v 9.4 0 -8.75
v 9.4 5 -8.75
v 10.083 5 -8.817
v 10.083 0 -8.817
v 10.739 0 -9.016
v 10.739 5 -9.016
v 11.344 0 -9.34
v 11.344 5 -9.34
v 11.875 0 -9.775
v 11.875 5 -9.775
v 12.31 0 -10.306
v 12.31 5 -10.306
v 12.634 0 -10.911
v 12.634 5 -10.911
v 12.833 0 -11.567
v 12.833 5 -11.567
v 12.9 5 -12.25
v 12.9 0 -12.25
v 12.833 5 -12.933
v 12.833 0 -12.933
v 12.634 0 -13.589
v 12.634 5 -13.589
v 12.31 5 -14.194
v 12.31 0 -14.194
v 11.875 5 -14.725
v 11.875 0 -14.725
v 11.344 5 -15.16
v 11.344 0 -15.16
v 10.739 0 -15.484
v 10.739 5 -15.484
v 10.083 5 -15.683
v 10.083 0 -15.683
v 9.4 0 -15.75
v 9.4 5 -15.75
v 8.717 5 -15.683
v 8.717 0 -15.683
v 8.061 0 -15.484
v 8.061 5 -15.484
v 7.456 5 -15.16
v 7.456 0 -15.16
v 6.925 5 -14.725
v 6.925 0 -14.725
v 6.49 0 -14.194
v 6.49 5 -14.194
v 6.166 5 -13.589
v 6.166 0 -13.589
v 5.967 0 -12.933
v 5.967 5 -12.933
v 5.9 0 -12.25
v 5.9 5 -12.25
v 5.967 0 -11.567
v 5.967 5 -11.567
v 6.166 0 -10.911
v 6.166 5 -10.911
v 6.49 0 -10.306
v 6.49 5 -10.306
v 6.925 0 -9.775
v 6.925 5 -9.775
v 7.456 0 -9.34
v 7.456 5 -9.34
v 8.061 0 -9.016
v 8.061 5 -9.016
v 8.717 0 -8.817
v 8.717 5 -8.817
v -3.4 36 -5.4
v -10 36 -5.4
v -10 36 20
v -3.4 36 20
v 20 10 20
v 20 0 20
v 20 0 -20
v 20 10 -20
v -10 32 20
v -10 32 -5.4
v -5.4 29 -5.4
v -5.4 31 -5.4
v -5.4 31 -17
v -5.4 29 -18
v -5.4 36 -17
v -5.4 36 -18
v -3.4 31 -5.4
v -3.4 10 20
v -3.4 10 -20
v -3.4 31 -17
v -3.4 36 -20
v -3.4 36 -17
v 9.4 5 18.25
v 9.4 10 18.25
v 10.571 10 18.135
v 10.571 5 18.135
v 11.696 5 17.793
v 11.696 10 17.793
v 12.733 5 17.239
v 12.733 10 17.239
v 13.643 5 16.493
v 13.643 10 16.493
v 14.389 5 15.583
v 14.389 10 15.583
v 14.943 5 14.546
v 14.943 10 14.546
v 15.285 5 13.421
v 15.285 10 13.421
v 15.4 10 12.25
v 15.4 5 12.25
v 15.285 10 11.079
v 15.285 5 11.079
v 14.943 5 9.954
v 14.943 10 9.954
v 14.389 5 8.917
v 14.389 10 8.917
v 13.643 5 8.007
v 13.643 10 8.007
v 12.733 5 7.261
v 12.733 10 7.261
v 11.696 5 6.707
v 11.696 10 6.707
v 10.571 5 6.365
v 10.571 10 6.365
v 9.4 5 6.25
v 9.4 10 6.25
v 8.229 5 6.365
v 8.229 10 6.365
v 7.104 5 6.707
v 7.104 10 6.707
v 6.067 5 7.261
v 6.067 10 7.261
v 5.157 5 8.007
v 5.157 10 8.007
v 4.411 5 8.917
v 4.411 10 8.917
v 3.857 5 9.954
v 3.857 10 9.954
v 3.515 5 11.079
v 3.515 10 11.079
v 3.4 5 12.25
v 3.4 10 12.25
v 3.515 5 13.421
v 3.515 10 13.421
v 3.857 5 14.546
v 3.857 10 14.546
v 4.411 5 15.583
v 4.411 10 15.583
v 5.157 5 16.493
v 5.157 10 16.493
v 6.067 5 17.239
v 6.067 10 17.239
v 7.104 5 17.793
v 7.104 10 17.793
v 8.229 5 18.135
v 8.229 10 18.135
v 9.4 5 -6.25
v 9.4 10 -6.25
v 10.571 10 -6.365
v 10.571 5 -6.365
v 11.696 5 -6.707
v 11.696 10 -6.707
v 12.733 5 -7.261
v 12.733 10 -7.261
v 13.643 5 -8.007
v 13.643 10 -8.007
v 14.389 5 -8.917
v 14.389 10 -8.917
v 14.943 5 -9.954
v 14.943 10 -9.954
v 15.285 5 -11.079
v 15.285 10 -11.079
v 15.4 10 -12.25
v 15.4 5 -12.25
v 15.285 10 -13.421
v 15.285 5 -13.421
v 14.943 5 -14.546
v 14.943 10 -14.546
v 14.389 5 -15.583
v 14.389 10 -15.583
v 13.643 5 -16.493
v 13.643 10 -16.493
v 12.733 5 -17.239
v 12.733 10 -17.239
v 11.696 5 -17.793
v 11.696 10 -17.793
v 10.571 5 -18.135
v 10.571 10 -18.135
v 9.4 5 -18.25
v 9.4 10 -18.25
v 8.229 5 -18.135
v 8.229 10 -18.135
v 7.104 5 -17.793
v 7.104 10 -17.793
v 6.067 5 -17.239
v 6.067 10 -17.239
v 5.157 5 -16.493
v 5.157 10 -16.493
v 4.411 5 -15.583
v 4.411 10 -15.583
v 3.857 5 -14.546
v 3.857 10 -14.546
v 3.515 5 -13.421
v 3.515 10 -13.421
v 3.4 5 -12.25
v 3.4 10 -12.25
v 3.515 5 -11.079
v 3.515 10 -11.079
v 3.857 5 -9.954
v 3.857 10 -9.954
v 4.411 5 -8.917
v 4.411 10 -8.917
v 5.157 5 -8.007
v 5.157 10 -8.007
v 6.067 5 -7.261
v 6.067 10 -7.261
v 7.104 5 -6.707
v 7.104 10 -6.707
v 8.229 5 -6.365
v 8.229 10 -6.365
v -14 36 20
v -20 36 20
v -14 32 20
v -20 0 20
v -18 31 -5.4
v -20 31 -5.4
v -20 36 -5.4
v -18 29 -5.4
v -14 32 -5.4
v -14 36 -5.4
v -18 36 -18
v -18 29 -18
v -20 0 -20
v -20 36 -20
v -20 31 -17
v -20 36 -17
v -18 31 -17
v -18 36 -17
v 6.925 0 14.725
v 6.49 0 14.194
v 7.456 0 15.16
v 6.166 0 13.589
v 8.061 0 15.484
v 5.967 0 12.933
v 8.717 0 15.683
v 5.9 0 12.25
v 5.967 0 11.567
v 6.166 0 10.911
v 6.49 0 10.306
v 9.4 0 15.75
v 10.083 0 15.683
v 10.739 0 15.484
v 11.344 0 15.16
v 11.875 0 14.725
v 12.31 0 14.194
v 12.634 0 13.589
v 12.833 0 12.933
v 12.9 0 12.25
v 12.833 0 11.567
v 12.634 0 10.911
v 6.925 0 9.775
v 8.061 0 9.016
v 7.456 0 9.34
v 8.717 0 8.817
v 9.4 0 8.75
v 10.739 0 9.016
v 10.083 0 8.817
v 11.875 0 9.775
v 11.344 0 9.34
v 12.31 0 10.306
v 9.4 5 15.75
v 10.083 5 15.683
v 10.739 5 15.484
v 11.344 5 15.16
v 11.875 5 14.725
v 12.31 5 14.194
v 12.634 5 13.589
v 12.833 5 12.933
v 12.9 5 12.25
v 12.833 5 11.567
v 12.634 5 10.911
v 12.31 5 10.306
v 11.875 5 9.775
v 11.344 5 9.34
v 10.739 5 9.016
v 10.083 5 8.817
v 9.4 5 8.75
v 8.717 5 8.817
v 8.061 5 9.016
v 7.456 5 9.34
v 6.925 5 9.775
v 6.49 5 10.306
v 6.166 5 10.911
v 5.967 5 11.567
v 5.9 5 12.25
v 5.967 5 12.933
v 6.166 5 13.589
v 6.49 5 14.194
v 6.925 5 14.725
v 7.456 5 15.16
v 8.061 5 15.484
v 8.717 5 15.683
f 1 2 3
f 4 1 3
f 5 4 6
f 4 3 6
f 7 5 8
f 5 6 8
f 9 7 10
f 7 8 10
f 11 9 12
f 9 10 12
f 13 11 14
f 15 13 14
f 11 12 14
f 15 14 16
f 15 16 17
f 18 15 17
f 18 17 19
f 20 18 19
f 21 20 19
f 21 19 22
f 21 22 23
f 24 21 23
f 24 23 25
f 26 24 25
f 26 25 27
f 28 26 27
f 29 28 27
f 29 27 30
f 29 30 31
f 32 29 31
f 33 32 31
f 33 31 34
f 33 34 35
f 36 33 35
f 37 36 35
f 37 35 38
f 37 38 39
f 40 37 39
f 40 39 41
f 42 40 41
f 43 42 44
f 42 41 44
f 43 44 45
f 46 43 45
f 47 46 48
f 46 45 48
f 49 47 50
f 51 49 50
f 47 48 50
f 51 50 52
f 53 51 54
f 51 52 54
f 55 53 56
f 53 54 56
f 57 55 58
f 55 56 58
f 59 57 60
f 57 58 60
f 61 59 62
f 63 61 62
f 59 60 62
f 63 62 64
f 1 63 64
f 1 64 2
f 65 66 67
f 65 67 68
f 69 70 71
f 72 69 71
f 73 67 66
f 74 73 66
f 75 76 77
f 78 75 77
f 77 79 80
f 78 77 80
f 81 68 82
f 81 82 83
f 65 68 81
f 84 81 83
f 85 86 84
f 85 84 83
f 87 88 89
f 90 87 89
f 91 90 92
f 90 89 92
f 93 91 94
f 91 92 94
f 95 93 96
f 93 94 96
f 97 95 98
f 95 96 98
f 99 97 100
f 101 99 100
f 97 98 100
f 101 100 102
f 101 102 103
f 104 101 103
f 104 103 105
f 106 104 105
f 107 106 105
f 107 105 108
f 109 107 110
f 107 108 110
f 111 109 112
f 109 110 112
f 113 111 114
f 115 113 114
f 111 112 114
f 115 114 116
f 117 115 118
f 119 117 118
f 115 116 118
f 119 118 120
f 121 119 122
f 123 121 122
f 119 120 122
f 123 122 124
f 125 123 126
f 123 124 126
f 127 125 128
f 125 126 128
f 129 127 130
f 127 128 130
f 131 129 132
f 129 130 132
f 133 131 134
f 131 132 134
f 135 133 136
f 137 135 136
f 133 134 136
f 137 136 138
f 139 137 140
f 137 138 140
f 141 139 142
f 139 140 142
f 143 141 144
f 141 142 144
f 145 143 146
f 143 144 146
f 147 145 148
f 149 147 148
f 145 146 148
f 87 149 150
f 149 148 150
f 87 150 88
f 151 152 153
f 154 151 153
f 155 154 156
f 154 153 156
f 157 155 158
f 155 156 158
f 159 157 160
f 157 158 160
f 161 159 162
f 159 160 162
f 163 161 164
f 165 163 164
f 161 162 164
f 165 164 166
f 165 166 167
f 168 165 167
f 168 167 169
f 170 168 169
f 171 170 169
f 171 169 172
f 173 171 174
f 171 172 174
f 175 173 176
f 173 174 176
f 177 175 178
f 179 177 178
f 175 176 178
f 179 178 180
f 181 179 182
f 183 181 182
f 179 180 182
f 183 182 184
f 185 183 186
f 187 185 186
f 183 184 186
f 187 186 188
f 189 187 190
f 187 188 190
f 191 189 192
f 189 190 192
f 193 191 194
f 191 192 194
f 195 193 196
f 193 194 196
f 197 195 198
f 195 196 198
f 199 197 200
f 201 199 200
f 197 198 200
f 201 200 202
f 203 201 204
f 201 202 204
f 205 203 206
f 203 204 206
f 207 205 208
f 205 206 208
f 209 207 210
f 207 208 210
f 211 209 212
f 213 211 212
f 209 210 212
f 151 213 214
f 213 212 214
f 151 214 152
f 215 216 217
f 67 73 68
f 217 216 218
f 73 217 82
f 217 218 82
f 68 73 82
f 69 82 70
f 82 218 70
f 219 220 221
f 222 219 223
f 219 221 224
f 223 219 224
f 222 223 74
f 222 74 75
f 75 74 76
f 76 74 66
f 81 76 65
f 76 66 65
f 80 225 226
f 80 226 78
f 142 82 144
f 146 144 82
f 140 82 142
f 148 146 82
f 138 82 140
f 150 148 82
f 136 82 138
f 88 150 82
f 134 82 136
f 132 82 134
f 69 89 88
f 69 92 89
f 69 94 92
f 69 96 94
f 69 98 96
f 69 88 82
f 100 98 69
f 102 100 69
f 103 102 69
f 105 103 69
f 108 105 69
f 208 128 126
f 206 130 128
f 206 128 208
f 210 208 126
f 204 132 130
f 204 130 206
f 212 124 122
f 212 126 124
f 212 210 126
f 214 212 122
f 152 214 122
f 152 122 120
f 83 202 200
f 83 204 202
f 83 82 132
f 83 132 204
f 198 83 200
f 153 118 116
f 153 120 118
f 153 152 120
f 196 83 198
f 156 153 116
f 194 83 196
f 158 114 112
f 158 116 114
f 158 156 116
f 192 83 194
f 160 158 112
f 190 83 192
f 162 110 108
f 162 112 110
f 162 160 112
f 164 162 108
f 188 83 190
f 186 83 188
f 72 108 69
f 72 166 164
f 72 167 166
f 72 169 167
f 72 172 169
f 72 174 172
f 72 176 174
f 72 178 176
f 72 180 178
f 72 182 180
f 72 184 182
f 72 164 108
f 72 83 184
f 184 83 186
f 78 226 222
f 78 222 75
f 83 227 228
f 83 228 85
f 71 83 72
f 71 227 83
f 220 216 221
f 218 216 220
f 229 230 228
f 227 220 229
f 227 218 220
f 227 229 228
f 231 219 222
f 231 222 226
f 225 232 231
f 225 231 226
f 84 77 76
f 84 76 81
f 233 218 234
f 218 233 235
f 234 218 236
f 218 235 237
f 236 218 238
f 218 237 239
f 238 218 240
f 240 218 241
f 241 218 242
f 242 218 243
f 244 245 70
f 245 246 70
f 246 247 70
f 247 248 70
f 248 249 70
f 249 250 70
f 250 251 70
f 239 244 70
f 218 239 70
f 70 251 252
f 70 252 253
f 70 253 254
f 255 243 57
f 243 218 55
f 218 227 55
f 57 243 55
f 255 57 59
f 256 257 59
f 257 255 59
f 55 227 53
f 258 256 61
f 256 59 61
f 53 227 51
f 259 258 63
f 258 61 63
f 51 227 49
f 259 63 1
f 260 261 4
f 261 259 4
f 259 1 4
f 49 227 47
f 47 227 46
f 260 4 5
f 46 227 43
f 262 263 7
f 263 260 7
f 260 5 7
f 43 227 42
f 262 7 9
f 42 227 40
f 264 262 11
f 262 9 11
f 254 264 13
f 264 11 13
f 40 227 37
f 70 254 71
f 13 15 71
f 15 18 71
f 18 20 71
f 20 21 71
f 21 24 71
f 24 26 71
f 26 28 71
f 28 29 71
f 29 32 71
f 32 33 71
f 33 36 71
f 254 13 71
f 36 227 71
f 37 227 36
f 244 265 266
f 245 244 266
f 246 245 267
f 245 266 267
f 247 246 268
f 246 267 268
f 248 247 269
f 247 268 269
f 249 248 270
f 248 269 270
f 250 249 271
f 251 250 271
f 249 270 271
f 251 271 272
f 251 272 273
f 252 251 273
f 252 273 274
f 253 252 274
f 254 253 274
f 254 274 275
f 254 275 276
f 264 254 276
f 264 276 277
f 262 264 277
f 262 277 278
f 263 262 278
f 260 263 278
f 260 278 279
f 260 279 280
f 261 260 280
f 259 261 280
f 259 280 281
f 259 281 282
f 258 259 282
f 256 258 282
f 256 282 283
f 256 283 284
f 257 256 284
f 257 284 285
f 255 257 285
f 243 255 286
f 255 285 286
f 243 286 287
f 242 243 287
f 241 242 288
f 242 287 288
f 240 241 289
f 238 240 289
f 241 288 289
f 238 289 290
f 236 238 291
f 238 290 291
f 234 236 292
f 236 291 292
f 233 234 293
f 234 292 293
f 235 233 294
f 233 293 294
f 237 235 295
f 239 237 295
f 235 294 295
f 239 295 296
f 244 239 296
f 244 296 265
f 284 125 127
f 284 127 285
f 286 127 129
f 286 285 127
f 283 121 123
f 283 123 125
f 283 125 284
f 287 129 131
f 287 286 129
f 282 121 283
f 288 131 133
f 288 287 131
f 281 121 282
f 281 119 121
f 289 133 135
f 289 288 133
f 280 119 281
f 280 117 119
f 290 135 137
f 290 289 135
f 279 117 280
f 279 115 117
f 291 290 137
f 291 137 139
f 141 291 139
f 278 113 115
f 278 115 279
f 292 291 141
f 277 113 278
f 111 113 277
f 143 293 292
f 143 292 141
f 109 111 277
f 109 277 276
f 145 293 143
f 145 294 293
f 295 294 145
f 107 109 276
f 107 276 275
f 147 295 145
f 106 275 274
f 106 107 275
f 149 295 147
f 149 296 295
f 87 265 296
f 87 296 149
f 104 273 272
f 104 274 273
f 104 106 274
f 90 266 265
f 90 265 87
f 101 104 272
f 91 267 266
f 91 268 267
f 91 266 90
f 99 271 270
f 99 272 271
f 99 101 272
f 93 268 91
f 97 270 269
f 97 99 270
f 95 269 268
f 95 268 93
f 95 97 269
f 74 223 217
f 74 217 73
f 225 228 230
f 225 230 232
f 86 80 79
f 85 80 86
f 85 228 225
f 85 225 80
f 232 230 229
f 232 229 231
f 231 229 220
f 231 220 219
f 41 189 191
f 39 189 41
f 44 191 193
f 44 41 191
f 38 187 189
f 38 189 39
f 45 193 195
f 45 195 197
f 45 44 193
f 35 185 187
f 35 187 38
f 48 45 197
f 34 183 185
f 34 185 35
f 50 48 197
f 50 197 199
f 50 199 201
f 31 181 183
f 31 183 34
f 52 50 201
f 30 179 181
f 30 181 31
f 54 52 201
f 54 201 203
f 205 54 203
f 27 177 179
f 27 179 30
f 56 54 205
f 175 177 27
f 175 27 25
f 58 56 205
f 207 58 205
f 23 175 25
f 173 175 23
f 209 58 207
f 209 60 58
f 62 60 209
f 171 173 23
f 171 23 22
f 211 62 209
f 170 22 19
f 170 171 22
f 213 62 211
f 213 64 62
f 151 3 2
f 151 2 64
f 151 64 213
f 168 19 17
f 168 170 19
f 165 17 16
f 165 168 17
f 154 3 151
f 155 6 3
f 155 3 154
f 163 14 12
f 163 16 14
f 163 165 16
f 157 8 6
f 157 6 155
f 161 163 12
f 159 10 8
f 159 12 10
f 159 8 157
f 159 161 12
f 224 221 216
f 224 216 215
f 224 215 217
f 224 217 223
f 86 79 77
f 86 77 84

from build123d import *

# Parameters (mm, degrees)
SKETCH_1_W          = 40
SKETCH_1_H          = 40
EXTRUDE_1_DEPTH     = 36
SKETCH_2_W          = 12.6
SKETCH_2_H          = 12.6
CUT_EXTRUDE_1_DEPTH = 7
SKETCH_3_W          = 2
SKETCH_3_H          = 11.6
CUT_EXTRUDE_2_DEPTH = 5
SKETCH_4_W          = 4
SKETCH_4_H          = 25.4
CUT_EXTRUDE_3_DEPTH = 4
SKETCH_5_W          = 23.4
SKETCH_5_H          = 40
CUT_EXTRUDE_6_DEPTH = 26
SKETCH_6_R          = 6
CUT_EXTRUDE_7_DEPTH = 5
SKETCH_7_R          = 3.5
CUT_EXTRUDE_8_DEPTH = 39.418745425


with BuildPart() as part:
    # 草图1 → 凸台-拉伸1 (new body)
    with BuildSketch(Plane(origin=(0, 0, 0), x_dir=(1, 0, 0), z_dir=(0, 1, 0))):
        Rectangle(SKETCH_1_W, SKETCH_1_H)
    extrude(amount=EXTRUDE_1_DEPTH)

    # 草图2 → 切除-拉伸1 (cut)
    with BuildSketch(Plane(origin=(0, 36, 0), x_dir=(1, 0, 0), z_dir=(0, 1, 0))):
        with Locations((-11.7, 11.7)):
            Rectangle(SKETCH_2_W, SKETCH_2_H)
    extrude(amount=-CUT_EXTRUDE_1_DEPTH, mode=Mode.SUBTRACT)

    # 草图3 → 切除-拉伸2 (cut)
    with BuildSketch(Plane(origin=(0, 36, 0), x_dir=(1, 0, 0), z_dir=(0, 1, 0))):
        with Locations((-19, 11.2)):
            Rectangle(SKETCH_3_W, SKETCH_3_H)
        with Locations((-4.4, 11.2)):
            Rectangle(SKETCH_3_W, SKETCH_3_H)
    extrude(amount=-CUT_EXTRUDE_2_DEPTH, mode=Mode.SUBTRACT)

    # 草图4 → 切除-拉伸3 (cut)
    with BuildSketch(Plane(origin=(0, 36, 0), x_dir=(1, 0, 0), z_dir=(0, 1, 0))):
        with Locations((-12, -7.3)):
            Rectangle(SKETCH_4_W, SKETCH_4_H)
    extrude(amount=-CUT_EXTRUDE_3_DEPTH, mode=Mode.SUBTRACT)

    # 草图5 → 切除-拉伸6 (cut)
    with BuildSketch(Plane(origin=(0, 36, 0), x_dir=(1, 0, 0), z_dir=(0, 1, 0))):
        with Locations((8.3, 0)):
            Rectangle(SKETCH_5_W, SKETCH_5_H)
    extrude(amount=-CUT_EXTRUDE_6_DEPTH, mode=Mode.SUBTRACT)

    # 草图6 → 切除-拉伸7 (cut)
    with BuildSketch(Plane(origin=(0, 10, 0), x_dir=(1, 0, 0), z_dir=(0, 1, 0))):
        with Locations(Location((9.4, 12.25, 0), (0, 0, 270))):
            Circle(SKETCH_6_R)
        with Locations(Location((9.4, -12.25, 0), (0, 0, 270))):
            Circle(SKETCH_6_R)
    extrude(amount=-CUT_EXTRUDE_7_DEPTH, mode=Mode.SUBTRACT)

    # 草图7 → 切除-拉伸8 (cut, through all)
    with BuildSketch(Plane(origin=(0, 10, 0), x_dir=(1, 0, 0), z_dir=(0, 1, 0))):
        with Locations(Location((9.4, 12.25, 0), (0, 0, 270))):
            Circle(SKETCH_7_R)
        with Locations(Location((9.4, -12.25, 0), (0, 0, 270))):
            Circle(SKETCH_7_R)
    extrude(amount=-CUT_EXTRUDE_8_DEPTH, mode=Mode.SUBTRACT)


solid = part.part
